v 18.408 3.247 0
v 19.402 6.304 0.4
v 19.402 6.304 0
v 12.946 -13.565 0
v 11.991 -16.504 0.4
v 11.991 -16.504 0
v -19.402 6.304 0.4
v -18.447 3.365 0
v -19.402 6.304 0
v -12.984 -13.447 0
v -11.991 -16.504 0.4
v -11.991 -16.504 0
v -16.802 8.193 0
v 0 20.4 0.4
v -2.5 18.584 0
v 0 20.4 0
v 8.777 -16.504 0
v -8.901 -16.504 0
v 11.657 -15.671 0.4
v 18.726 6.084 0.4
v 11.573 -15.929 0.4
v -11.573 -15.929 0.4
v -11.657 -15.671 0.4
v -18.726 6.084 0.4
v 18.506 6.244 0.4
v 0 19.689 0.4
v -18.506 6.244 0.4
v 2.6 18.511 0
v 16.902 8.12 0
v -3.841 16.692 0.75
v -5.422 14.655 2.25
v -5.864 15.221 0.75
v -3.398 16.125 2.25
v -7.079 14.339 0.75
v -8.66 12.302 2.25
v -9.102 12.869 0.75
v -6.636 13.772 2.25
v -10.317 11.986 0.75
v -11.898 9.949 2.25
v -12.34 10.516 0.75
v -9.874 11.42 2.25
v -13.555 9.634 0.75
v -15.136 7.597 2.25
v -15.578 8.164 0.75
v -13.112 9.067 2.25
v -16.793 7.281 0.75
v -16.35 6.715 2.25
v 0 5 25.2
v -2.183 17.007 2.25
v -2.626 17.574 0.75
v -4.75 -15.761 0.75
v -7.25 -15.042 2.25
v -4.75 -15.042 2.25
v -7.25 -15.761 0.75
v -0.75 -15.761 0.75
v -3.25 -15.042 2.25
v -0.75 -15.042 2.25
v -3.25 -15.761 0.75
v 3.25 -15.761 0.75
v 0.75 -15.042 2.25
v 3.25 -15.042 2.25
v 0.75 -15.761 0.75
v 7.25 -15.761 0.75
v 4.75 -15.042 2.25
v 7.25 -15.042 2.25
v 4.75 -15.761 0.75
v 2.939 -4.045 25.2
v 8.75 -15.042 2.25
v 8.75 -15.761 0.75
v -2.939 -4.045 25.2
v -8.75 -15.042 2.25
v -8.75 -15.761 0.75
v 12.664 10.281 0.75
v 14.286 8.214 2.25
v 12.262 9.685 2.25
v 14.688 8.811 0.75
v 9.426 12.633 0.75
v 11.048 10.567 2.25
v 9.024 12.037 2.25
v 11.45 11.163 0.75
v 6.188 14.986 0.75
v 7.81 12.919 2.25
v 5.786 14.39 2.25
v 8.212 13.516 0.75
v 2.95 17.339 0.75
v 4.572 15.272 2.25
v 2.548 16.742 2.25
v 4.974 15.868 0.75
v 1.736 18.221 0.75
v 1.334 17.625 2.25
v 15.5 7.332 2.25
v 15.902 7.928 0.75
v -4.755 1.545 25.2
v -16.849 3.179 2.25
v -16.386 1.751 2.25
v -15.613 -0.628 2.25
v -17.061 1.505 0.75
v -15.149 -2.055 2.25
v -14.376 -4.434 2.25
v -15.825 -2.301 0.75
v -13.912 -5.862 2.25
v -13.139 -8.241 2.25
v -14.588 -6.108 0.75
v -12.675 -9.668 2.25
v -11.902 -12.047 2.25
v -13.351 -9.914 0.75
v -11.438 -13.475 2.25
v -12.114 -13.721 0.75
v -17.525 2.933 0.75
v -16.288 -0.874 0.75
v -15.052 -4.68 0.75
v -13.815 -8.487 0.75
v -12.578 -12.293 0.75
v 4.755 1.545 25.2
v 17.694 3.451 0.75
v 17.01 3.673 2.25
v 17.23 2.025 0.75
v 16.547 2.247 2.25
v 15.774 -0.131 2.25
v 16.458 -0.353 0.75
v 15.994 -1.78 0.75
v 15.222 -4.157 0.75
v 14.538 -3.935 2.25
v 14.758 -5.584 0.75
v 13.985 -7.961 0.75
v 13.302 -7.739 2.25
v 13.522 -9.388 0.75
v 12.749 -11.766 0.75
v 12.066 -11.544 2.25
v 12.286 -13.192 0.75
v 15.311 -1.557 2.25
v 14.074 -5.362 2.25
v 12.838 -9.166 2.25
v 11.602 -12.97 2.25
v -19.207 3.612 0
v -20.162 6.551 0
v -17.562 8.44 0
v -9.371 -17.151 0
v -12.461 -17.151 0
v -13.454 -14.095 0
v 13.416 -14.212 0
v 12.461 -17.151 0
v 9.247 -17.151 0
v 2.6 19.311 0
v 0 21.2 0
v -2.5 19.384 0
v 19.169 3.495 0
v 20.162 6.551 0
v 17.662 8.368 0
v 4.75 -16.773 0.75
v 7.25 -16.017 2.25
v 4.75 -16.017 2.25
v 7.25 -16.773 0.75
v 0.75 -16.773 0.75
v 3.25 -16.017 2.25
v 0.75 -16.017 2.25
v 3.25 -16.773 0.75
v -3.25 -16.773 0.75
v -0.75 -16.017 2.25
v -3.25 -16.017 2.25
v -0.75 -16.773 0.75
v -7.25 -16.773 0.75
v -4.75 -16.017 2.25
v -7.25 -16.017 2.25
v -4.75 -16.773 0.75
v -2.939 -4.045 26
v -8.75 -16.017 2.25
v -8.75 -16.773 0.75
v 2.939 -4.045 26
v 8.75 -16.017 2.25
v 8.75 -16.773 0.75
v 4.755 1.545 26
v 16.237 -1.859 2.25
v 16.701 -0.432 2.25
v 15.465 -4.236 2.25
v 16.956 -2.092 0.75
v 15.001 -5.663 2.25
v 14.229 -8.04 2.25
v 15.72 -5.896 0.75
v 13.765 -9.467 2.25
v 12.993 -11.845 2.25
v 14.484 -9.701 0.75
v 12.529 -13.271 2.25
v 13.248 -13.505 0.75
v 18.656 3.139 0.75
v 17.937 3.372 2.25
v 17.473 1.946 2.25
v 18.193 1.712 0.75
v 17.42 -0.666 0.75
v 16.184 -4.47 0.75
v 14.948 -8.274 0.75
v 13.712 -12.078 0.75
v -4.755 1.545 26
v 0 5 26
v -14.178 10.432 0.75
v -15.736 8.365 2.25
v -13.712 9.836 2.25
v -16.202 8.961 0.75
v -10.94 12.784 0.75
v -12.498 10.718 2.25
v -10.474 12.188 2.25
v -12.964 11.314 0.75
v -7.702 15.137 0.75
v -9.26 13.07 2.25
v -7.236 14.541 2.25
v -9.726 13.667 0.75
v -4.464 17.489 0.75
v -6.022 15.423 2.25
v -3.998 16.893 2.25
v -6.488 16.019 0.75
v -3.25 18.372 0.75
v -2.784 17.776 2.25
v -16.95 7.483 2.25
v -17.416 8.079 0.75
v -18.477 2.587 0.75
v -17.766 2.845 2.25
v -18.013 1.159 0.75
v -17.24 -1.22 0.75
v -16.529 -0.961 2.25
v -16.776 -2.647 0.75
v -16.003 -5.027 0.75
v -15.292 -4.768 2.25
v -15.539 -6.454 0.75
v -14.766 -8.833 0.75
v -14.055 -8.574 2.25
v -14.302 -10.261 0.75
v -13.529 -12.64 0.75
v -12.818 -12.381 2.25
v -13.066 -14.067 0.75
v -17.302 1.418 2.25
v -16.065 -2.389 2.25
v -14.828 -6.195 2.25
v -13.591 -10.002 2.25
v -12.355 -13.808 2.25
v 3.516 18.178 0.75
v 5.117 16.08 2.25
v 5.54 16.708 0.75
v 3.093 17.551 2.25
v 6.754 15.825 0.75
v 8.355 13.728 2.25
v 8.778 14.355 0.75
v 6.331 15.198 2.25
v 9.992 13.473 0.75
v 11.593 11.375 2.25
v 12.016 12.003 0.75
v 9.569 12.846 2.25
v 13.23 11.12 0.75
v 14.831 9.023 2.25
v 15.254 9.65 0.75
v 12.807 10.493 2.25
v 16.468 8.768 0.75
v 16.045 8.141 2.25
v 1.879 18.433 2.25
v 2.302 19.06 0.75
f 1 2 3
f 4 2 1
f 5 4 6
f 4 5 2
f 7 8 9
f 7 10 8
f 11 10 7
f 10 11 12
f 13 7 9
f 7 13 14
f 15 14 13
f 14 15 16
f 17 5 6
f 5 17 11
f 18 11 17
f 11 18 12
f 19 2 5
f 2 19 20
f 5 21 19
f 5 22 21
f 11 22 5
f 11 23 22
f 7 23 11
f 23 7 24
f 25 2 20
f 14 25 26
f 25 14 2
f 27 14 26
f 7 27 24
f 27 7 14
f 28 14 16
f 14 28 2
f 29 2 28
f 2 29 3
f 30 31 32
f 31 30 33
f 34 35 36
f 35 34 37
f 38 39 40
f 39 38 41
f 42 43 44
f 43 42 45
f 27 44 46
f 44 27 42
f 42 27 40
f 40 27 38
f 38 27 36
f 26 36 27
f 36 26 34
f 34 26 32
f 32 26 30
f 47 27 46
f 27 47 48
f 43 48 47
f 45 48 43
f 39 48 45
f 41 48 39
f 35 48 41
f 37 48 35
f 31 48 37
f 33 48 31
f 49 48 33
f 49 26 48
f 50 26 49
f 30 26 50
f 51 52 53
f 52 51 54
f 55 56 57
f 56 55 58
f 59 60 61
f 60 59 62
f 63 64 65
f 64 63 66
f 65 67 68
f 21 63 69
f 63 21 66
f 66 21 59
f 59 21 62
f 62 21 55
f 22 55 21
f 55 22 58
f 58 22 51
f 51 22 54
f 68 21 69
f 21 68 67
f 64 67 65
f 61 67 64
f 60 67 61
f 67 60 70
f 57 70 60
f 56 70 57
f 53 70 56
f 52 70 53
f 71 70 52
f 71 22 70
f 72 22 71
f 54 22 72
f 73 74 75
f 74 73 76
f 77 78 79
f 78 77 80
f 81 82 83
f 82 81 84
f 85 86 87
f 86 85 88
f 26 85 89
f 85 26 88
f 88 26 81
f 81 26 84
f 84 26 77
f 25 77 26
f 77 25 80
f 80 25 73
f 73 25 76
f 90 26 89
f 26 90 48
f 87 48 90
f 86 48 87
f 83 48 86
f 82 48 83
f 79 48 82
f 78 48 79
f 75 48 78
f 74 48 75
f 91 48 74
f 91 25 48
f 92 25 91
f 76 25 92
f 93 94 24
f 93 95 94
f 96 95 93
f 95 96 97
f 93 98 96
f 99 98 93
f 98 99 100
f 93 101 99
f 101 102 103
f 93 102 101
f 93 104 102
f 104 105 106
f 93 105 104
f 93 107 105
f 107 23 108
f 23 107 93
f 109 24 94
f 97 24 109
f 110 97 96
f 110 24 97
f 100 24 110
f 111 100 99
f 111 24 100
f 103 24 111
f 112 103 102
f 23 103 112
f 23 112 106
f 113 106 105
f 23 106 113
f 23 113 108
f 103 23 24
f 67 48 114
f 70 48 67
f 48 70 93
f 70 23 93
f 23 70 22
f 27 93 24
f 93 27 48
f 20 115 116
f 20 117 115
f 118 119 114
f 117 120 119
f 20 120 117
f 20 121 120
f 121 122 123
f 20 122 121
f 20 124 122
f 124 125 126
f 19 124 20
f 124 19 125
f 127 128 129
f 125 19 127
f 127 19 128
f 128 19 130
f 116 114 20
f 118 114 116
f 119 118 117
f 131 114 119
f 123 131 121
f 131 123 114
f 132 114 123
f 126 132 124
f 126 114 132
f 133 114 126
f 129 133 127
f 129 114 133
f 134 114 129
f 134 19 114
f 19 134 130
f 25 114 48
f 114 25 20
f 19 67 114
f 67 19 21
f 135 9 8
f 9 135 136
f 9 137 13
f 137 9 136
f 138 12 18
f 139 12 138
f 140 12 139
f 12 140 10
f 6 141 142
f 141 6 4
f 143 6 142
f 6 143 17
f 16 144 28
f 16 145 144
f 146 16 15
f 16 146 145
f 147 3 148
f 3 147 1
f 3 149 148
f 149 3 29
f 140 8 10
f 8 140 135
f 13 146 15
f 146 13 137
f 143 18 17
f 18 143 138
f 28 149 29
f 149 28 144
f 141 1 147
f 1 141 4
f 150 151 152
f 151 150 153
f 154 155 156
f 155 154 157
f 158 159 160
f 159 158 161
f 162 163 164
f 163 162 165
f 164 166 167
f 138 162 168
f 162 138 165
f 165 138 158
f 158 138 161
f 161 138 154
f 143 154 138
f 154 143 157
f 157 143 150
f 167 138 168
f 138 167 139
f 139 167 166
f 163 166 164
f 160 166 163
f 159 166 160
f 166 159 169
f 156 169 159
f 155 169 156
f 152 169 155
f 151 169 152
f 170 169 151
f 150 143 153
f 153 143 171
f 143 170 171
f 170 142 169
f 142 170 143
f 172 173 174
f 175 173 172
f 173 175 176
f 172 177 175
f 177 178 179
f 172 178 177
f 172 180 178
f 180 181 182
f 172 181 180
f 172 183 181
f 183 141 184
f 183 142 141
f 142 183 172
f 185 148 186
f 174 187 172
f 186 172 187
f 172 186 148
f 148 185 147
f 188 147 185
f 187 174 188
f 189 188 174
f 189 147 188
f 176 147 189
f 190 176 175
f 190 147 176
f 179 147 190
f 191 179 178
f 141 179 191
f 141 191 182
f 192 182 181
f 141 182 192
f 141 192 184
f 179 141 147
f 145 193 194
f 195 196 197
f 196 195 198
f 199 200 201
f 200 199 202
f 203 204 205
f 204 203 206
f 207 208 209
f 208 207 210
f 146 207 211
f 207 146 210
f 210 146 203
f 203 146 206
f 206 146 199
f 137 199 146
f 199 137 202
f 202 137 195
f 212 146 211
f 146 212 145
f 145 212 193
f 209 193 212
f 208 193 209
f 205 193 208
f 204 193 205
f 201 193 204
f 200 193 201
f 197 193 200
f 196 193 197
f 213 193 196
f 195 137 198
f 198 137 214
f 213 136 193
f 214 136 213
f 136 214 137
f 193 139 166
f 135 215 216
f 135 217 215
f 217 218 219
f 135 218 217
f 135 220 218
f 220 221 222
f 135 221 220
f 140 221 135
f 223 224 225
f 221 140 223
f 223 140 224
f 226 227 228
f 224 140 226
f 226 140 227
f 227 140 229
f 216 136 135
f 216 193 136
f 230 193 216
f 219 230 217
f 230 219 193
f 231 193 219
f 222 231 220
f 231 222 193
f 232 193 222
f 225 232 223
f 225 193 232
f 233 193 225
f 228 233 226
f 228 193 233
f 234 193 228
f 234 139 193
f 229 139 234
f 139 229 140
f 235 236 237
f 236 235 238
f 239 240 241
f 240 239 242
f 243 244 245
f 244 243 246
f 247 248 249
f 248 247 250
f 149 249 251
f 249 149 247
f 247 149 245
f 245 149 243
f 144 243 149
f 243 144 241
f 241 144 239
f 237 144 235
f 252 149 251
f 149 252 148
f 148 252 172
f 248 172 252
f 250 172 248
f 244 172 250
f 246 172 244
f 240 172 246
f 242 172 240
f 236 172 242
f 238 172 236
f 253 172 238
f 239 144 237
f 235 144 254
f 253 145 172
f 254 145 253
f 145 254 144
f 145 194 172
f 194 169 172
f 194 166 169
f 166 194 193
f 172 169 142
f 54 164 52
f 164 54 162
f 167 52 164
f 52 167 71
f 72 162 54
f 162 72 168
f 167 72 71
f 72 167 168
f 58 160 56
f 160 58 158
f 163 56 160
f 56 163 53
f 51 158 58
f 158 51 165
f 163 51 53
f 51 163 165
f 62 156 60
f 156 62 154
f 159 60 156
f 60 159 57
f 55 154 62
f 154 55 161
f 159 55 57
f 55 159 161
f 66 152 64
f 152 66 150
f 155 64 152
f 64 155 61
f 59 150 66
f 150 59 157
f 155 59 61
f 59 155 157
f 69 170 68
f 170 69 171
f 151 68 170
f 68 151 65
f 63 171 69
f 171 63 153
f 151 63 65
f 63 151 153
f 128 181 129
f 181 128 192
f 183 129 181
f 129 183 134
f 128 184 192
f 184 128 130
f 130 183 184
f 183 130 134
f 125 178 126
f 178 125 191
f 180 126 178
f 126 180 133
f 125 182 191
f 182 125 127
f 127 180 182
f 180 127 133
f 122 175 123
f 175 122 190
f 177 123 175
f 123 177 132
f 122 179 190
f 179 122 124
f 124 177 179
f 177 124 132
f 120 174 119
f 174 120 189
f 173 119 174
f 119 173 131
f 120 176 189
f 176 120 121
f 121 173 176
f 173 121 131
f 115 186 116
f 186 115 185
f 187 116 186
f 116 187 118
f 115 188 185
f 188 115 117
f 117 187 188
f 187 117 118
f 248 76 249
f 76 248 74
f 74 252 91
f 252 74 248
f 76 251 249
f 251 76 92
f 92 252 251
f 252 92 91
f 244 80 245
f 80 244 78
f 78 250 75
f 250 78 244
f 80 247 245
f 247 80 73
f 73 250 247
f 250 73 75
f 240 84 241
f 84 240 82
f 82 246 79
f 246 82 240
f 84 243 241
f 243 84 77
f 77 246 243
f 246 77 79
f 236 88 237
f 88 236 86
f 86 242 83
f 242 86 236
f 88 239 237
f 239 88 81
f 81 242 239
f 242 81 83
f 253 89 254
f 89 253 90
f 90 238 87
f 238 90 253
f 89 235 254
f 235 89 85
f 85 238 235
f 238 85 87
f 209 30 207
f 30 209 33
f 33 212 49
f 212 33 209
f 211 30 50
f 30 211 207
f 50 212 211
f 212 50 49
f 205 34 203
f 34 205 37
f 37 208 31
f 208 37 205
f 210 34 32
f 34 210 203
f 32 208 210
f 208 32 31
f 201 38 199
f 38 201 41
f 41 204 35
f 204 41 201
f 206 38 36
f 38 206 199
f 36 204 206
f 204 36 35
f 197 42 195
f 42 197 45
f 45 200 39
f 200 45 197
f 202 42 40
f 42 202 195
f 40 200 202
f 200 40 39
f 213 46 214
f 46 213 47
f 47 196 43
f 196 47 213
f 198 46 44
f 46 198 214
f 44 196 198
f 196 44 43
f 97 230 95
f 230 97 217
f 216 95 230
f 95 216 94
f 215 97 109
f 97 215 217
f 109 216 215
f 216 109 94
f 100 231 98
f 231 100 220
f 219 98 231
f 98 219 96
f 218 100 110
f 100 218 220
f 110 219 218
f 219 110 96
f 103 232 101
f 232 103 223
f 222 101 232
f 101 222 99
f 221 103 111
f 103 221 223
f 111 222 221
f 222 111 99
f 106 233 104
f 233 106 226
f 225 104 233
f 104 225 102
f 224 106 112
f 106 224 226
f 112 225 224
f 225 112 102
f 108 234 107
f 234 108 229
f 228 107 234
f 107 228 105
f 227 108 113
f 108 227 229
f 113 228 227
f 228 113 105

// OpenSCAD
/*
OpenSCAD sketch to generate snap-fit spikes for BlinkyTiles!
Coded by Ben Rockhold in Sept 2014
No rights reserved.

*/

/* [Parameters] */
// This makes the cone taller! Note; values smaller than ~30 may not be printable.
CrystalHeight = 26;
// Radius of the cone point, just in case you don't want a cone.
ConePoint = 5;
// This is the wall thickness of the cone -- note, my math is broken.
WallThickness = 0.8;
// Used to tune the snap-fit
PrintTolerance = 0.1; 

/* [Tile Constants] */
// Probably should not change these, but here they are.
// The cylinder needs to become defined by the tangents of a regular pentagon that is ~30.9mm to a side
PentaRadius = 21.2;
ClipLength = 0;
//ClipLength = 1.67*2;
LegWidth = 5;

module cone(){

	difference(){
		rotate([0,0,90])union(){
			cylinder(r=PentaRadius,h=ClipLength,$fn=5);
			translate([0,0,ClipLength])
				cylinder(r1=PentaRadius,r2=ConePoint,h=CrystalHeight,$fn=5);
		}
		// shelling the cylinder; vertical translation used for wall thickness -- yes, I know...
		rotate([0,0,90]){
			translate([0,0,-0.1])cylinder(r=PentaRadius-WallThickness,h=ClipLength+0.5,$fn=5);
			translate([0,0,ClipLength-WallThickness])
				cylinder(r1=PentaRadius-WallThickness,r2=ConePoint,h=CrystalHeight,$fn=5);
		}
		for(i=[1:5]){
			rotate([0,0,i*(360/5)])
				translate([-LegWidth/2,0,-0.1])
					cube([LegWidth+PrintTolerance,PentaRadius*2,ClipLength+0.1]);
		}
	}
	//%cylinder(r=PentaRadius,h=5,$fn=50);
}


/* Holes for sewing */

render() difference() {

	cone();

	translate([0,0,0.5]){
		// face 1
		for (trans = [-8:4:8]){
			translate([trans,-16,1])
				cube([1.5,5,1.5], center=true);
		}

		// face 2
		rotate([0,0,72])
			for (trans = [-8:4:8]){
				translate([trans,-16,1])
					cube([1.5,5,1.5], center=true);
			}

		// face 3
		rotate([0,0,146])
			for (trans = [-8:4:8]){
				translate([trans,-16,1])
					cube([1.5,5,1.5], center=true);
			}

		// face 4
		rotate([0,0,218])
			for (trans = [-8:4:8]){
				translate([trans,-16,1])
					cube([1.5,5,1.5], center=true);
			}
		// face 5
		rotate([0,0,290])
			for (trans = [-8:4:8]){
				translate([trans,-16,1])
					cube([1.5,5,1.5], center=true);
			}
	}
}	
